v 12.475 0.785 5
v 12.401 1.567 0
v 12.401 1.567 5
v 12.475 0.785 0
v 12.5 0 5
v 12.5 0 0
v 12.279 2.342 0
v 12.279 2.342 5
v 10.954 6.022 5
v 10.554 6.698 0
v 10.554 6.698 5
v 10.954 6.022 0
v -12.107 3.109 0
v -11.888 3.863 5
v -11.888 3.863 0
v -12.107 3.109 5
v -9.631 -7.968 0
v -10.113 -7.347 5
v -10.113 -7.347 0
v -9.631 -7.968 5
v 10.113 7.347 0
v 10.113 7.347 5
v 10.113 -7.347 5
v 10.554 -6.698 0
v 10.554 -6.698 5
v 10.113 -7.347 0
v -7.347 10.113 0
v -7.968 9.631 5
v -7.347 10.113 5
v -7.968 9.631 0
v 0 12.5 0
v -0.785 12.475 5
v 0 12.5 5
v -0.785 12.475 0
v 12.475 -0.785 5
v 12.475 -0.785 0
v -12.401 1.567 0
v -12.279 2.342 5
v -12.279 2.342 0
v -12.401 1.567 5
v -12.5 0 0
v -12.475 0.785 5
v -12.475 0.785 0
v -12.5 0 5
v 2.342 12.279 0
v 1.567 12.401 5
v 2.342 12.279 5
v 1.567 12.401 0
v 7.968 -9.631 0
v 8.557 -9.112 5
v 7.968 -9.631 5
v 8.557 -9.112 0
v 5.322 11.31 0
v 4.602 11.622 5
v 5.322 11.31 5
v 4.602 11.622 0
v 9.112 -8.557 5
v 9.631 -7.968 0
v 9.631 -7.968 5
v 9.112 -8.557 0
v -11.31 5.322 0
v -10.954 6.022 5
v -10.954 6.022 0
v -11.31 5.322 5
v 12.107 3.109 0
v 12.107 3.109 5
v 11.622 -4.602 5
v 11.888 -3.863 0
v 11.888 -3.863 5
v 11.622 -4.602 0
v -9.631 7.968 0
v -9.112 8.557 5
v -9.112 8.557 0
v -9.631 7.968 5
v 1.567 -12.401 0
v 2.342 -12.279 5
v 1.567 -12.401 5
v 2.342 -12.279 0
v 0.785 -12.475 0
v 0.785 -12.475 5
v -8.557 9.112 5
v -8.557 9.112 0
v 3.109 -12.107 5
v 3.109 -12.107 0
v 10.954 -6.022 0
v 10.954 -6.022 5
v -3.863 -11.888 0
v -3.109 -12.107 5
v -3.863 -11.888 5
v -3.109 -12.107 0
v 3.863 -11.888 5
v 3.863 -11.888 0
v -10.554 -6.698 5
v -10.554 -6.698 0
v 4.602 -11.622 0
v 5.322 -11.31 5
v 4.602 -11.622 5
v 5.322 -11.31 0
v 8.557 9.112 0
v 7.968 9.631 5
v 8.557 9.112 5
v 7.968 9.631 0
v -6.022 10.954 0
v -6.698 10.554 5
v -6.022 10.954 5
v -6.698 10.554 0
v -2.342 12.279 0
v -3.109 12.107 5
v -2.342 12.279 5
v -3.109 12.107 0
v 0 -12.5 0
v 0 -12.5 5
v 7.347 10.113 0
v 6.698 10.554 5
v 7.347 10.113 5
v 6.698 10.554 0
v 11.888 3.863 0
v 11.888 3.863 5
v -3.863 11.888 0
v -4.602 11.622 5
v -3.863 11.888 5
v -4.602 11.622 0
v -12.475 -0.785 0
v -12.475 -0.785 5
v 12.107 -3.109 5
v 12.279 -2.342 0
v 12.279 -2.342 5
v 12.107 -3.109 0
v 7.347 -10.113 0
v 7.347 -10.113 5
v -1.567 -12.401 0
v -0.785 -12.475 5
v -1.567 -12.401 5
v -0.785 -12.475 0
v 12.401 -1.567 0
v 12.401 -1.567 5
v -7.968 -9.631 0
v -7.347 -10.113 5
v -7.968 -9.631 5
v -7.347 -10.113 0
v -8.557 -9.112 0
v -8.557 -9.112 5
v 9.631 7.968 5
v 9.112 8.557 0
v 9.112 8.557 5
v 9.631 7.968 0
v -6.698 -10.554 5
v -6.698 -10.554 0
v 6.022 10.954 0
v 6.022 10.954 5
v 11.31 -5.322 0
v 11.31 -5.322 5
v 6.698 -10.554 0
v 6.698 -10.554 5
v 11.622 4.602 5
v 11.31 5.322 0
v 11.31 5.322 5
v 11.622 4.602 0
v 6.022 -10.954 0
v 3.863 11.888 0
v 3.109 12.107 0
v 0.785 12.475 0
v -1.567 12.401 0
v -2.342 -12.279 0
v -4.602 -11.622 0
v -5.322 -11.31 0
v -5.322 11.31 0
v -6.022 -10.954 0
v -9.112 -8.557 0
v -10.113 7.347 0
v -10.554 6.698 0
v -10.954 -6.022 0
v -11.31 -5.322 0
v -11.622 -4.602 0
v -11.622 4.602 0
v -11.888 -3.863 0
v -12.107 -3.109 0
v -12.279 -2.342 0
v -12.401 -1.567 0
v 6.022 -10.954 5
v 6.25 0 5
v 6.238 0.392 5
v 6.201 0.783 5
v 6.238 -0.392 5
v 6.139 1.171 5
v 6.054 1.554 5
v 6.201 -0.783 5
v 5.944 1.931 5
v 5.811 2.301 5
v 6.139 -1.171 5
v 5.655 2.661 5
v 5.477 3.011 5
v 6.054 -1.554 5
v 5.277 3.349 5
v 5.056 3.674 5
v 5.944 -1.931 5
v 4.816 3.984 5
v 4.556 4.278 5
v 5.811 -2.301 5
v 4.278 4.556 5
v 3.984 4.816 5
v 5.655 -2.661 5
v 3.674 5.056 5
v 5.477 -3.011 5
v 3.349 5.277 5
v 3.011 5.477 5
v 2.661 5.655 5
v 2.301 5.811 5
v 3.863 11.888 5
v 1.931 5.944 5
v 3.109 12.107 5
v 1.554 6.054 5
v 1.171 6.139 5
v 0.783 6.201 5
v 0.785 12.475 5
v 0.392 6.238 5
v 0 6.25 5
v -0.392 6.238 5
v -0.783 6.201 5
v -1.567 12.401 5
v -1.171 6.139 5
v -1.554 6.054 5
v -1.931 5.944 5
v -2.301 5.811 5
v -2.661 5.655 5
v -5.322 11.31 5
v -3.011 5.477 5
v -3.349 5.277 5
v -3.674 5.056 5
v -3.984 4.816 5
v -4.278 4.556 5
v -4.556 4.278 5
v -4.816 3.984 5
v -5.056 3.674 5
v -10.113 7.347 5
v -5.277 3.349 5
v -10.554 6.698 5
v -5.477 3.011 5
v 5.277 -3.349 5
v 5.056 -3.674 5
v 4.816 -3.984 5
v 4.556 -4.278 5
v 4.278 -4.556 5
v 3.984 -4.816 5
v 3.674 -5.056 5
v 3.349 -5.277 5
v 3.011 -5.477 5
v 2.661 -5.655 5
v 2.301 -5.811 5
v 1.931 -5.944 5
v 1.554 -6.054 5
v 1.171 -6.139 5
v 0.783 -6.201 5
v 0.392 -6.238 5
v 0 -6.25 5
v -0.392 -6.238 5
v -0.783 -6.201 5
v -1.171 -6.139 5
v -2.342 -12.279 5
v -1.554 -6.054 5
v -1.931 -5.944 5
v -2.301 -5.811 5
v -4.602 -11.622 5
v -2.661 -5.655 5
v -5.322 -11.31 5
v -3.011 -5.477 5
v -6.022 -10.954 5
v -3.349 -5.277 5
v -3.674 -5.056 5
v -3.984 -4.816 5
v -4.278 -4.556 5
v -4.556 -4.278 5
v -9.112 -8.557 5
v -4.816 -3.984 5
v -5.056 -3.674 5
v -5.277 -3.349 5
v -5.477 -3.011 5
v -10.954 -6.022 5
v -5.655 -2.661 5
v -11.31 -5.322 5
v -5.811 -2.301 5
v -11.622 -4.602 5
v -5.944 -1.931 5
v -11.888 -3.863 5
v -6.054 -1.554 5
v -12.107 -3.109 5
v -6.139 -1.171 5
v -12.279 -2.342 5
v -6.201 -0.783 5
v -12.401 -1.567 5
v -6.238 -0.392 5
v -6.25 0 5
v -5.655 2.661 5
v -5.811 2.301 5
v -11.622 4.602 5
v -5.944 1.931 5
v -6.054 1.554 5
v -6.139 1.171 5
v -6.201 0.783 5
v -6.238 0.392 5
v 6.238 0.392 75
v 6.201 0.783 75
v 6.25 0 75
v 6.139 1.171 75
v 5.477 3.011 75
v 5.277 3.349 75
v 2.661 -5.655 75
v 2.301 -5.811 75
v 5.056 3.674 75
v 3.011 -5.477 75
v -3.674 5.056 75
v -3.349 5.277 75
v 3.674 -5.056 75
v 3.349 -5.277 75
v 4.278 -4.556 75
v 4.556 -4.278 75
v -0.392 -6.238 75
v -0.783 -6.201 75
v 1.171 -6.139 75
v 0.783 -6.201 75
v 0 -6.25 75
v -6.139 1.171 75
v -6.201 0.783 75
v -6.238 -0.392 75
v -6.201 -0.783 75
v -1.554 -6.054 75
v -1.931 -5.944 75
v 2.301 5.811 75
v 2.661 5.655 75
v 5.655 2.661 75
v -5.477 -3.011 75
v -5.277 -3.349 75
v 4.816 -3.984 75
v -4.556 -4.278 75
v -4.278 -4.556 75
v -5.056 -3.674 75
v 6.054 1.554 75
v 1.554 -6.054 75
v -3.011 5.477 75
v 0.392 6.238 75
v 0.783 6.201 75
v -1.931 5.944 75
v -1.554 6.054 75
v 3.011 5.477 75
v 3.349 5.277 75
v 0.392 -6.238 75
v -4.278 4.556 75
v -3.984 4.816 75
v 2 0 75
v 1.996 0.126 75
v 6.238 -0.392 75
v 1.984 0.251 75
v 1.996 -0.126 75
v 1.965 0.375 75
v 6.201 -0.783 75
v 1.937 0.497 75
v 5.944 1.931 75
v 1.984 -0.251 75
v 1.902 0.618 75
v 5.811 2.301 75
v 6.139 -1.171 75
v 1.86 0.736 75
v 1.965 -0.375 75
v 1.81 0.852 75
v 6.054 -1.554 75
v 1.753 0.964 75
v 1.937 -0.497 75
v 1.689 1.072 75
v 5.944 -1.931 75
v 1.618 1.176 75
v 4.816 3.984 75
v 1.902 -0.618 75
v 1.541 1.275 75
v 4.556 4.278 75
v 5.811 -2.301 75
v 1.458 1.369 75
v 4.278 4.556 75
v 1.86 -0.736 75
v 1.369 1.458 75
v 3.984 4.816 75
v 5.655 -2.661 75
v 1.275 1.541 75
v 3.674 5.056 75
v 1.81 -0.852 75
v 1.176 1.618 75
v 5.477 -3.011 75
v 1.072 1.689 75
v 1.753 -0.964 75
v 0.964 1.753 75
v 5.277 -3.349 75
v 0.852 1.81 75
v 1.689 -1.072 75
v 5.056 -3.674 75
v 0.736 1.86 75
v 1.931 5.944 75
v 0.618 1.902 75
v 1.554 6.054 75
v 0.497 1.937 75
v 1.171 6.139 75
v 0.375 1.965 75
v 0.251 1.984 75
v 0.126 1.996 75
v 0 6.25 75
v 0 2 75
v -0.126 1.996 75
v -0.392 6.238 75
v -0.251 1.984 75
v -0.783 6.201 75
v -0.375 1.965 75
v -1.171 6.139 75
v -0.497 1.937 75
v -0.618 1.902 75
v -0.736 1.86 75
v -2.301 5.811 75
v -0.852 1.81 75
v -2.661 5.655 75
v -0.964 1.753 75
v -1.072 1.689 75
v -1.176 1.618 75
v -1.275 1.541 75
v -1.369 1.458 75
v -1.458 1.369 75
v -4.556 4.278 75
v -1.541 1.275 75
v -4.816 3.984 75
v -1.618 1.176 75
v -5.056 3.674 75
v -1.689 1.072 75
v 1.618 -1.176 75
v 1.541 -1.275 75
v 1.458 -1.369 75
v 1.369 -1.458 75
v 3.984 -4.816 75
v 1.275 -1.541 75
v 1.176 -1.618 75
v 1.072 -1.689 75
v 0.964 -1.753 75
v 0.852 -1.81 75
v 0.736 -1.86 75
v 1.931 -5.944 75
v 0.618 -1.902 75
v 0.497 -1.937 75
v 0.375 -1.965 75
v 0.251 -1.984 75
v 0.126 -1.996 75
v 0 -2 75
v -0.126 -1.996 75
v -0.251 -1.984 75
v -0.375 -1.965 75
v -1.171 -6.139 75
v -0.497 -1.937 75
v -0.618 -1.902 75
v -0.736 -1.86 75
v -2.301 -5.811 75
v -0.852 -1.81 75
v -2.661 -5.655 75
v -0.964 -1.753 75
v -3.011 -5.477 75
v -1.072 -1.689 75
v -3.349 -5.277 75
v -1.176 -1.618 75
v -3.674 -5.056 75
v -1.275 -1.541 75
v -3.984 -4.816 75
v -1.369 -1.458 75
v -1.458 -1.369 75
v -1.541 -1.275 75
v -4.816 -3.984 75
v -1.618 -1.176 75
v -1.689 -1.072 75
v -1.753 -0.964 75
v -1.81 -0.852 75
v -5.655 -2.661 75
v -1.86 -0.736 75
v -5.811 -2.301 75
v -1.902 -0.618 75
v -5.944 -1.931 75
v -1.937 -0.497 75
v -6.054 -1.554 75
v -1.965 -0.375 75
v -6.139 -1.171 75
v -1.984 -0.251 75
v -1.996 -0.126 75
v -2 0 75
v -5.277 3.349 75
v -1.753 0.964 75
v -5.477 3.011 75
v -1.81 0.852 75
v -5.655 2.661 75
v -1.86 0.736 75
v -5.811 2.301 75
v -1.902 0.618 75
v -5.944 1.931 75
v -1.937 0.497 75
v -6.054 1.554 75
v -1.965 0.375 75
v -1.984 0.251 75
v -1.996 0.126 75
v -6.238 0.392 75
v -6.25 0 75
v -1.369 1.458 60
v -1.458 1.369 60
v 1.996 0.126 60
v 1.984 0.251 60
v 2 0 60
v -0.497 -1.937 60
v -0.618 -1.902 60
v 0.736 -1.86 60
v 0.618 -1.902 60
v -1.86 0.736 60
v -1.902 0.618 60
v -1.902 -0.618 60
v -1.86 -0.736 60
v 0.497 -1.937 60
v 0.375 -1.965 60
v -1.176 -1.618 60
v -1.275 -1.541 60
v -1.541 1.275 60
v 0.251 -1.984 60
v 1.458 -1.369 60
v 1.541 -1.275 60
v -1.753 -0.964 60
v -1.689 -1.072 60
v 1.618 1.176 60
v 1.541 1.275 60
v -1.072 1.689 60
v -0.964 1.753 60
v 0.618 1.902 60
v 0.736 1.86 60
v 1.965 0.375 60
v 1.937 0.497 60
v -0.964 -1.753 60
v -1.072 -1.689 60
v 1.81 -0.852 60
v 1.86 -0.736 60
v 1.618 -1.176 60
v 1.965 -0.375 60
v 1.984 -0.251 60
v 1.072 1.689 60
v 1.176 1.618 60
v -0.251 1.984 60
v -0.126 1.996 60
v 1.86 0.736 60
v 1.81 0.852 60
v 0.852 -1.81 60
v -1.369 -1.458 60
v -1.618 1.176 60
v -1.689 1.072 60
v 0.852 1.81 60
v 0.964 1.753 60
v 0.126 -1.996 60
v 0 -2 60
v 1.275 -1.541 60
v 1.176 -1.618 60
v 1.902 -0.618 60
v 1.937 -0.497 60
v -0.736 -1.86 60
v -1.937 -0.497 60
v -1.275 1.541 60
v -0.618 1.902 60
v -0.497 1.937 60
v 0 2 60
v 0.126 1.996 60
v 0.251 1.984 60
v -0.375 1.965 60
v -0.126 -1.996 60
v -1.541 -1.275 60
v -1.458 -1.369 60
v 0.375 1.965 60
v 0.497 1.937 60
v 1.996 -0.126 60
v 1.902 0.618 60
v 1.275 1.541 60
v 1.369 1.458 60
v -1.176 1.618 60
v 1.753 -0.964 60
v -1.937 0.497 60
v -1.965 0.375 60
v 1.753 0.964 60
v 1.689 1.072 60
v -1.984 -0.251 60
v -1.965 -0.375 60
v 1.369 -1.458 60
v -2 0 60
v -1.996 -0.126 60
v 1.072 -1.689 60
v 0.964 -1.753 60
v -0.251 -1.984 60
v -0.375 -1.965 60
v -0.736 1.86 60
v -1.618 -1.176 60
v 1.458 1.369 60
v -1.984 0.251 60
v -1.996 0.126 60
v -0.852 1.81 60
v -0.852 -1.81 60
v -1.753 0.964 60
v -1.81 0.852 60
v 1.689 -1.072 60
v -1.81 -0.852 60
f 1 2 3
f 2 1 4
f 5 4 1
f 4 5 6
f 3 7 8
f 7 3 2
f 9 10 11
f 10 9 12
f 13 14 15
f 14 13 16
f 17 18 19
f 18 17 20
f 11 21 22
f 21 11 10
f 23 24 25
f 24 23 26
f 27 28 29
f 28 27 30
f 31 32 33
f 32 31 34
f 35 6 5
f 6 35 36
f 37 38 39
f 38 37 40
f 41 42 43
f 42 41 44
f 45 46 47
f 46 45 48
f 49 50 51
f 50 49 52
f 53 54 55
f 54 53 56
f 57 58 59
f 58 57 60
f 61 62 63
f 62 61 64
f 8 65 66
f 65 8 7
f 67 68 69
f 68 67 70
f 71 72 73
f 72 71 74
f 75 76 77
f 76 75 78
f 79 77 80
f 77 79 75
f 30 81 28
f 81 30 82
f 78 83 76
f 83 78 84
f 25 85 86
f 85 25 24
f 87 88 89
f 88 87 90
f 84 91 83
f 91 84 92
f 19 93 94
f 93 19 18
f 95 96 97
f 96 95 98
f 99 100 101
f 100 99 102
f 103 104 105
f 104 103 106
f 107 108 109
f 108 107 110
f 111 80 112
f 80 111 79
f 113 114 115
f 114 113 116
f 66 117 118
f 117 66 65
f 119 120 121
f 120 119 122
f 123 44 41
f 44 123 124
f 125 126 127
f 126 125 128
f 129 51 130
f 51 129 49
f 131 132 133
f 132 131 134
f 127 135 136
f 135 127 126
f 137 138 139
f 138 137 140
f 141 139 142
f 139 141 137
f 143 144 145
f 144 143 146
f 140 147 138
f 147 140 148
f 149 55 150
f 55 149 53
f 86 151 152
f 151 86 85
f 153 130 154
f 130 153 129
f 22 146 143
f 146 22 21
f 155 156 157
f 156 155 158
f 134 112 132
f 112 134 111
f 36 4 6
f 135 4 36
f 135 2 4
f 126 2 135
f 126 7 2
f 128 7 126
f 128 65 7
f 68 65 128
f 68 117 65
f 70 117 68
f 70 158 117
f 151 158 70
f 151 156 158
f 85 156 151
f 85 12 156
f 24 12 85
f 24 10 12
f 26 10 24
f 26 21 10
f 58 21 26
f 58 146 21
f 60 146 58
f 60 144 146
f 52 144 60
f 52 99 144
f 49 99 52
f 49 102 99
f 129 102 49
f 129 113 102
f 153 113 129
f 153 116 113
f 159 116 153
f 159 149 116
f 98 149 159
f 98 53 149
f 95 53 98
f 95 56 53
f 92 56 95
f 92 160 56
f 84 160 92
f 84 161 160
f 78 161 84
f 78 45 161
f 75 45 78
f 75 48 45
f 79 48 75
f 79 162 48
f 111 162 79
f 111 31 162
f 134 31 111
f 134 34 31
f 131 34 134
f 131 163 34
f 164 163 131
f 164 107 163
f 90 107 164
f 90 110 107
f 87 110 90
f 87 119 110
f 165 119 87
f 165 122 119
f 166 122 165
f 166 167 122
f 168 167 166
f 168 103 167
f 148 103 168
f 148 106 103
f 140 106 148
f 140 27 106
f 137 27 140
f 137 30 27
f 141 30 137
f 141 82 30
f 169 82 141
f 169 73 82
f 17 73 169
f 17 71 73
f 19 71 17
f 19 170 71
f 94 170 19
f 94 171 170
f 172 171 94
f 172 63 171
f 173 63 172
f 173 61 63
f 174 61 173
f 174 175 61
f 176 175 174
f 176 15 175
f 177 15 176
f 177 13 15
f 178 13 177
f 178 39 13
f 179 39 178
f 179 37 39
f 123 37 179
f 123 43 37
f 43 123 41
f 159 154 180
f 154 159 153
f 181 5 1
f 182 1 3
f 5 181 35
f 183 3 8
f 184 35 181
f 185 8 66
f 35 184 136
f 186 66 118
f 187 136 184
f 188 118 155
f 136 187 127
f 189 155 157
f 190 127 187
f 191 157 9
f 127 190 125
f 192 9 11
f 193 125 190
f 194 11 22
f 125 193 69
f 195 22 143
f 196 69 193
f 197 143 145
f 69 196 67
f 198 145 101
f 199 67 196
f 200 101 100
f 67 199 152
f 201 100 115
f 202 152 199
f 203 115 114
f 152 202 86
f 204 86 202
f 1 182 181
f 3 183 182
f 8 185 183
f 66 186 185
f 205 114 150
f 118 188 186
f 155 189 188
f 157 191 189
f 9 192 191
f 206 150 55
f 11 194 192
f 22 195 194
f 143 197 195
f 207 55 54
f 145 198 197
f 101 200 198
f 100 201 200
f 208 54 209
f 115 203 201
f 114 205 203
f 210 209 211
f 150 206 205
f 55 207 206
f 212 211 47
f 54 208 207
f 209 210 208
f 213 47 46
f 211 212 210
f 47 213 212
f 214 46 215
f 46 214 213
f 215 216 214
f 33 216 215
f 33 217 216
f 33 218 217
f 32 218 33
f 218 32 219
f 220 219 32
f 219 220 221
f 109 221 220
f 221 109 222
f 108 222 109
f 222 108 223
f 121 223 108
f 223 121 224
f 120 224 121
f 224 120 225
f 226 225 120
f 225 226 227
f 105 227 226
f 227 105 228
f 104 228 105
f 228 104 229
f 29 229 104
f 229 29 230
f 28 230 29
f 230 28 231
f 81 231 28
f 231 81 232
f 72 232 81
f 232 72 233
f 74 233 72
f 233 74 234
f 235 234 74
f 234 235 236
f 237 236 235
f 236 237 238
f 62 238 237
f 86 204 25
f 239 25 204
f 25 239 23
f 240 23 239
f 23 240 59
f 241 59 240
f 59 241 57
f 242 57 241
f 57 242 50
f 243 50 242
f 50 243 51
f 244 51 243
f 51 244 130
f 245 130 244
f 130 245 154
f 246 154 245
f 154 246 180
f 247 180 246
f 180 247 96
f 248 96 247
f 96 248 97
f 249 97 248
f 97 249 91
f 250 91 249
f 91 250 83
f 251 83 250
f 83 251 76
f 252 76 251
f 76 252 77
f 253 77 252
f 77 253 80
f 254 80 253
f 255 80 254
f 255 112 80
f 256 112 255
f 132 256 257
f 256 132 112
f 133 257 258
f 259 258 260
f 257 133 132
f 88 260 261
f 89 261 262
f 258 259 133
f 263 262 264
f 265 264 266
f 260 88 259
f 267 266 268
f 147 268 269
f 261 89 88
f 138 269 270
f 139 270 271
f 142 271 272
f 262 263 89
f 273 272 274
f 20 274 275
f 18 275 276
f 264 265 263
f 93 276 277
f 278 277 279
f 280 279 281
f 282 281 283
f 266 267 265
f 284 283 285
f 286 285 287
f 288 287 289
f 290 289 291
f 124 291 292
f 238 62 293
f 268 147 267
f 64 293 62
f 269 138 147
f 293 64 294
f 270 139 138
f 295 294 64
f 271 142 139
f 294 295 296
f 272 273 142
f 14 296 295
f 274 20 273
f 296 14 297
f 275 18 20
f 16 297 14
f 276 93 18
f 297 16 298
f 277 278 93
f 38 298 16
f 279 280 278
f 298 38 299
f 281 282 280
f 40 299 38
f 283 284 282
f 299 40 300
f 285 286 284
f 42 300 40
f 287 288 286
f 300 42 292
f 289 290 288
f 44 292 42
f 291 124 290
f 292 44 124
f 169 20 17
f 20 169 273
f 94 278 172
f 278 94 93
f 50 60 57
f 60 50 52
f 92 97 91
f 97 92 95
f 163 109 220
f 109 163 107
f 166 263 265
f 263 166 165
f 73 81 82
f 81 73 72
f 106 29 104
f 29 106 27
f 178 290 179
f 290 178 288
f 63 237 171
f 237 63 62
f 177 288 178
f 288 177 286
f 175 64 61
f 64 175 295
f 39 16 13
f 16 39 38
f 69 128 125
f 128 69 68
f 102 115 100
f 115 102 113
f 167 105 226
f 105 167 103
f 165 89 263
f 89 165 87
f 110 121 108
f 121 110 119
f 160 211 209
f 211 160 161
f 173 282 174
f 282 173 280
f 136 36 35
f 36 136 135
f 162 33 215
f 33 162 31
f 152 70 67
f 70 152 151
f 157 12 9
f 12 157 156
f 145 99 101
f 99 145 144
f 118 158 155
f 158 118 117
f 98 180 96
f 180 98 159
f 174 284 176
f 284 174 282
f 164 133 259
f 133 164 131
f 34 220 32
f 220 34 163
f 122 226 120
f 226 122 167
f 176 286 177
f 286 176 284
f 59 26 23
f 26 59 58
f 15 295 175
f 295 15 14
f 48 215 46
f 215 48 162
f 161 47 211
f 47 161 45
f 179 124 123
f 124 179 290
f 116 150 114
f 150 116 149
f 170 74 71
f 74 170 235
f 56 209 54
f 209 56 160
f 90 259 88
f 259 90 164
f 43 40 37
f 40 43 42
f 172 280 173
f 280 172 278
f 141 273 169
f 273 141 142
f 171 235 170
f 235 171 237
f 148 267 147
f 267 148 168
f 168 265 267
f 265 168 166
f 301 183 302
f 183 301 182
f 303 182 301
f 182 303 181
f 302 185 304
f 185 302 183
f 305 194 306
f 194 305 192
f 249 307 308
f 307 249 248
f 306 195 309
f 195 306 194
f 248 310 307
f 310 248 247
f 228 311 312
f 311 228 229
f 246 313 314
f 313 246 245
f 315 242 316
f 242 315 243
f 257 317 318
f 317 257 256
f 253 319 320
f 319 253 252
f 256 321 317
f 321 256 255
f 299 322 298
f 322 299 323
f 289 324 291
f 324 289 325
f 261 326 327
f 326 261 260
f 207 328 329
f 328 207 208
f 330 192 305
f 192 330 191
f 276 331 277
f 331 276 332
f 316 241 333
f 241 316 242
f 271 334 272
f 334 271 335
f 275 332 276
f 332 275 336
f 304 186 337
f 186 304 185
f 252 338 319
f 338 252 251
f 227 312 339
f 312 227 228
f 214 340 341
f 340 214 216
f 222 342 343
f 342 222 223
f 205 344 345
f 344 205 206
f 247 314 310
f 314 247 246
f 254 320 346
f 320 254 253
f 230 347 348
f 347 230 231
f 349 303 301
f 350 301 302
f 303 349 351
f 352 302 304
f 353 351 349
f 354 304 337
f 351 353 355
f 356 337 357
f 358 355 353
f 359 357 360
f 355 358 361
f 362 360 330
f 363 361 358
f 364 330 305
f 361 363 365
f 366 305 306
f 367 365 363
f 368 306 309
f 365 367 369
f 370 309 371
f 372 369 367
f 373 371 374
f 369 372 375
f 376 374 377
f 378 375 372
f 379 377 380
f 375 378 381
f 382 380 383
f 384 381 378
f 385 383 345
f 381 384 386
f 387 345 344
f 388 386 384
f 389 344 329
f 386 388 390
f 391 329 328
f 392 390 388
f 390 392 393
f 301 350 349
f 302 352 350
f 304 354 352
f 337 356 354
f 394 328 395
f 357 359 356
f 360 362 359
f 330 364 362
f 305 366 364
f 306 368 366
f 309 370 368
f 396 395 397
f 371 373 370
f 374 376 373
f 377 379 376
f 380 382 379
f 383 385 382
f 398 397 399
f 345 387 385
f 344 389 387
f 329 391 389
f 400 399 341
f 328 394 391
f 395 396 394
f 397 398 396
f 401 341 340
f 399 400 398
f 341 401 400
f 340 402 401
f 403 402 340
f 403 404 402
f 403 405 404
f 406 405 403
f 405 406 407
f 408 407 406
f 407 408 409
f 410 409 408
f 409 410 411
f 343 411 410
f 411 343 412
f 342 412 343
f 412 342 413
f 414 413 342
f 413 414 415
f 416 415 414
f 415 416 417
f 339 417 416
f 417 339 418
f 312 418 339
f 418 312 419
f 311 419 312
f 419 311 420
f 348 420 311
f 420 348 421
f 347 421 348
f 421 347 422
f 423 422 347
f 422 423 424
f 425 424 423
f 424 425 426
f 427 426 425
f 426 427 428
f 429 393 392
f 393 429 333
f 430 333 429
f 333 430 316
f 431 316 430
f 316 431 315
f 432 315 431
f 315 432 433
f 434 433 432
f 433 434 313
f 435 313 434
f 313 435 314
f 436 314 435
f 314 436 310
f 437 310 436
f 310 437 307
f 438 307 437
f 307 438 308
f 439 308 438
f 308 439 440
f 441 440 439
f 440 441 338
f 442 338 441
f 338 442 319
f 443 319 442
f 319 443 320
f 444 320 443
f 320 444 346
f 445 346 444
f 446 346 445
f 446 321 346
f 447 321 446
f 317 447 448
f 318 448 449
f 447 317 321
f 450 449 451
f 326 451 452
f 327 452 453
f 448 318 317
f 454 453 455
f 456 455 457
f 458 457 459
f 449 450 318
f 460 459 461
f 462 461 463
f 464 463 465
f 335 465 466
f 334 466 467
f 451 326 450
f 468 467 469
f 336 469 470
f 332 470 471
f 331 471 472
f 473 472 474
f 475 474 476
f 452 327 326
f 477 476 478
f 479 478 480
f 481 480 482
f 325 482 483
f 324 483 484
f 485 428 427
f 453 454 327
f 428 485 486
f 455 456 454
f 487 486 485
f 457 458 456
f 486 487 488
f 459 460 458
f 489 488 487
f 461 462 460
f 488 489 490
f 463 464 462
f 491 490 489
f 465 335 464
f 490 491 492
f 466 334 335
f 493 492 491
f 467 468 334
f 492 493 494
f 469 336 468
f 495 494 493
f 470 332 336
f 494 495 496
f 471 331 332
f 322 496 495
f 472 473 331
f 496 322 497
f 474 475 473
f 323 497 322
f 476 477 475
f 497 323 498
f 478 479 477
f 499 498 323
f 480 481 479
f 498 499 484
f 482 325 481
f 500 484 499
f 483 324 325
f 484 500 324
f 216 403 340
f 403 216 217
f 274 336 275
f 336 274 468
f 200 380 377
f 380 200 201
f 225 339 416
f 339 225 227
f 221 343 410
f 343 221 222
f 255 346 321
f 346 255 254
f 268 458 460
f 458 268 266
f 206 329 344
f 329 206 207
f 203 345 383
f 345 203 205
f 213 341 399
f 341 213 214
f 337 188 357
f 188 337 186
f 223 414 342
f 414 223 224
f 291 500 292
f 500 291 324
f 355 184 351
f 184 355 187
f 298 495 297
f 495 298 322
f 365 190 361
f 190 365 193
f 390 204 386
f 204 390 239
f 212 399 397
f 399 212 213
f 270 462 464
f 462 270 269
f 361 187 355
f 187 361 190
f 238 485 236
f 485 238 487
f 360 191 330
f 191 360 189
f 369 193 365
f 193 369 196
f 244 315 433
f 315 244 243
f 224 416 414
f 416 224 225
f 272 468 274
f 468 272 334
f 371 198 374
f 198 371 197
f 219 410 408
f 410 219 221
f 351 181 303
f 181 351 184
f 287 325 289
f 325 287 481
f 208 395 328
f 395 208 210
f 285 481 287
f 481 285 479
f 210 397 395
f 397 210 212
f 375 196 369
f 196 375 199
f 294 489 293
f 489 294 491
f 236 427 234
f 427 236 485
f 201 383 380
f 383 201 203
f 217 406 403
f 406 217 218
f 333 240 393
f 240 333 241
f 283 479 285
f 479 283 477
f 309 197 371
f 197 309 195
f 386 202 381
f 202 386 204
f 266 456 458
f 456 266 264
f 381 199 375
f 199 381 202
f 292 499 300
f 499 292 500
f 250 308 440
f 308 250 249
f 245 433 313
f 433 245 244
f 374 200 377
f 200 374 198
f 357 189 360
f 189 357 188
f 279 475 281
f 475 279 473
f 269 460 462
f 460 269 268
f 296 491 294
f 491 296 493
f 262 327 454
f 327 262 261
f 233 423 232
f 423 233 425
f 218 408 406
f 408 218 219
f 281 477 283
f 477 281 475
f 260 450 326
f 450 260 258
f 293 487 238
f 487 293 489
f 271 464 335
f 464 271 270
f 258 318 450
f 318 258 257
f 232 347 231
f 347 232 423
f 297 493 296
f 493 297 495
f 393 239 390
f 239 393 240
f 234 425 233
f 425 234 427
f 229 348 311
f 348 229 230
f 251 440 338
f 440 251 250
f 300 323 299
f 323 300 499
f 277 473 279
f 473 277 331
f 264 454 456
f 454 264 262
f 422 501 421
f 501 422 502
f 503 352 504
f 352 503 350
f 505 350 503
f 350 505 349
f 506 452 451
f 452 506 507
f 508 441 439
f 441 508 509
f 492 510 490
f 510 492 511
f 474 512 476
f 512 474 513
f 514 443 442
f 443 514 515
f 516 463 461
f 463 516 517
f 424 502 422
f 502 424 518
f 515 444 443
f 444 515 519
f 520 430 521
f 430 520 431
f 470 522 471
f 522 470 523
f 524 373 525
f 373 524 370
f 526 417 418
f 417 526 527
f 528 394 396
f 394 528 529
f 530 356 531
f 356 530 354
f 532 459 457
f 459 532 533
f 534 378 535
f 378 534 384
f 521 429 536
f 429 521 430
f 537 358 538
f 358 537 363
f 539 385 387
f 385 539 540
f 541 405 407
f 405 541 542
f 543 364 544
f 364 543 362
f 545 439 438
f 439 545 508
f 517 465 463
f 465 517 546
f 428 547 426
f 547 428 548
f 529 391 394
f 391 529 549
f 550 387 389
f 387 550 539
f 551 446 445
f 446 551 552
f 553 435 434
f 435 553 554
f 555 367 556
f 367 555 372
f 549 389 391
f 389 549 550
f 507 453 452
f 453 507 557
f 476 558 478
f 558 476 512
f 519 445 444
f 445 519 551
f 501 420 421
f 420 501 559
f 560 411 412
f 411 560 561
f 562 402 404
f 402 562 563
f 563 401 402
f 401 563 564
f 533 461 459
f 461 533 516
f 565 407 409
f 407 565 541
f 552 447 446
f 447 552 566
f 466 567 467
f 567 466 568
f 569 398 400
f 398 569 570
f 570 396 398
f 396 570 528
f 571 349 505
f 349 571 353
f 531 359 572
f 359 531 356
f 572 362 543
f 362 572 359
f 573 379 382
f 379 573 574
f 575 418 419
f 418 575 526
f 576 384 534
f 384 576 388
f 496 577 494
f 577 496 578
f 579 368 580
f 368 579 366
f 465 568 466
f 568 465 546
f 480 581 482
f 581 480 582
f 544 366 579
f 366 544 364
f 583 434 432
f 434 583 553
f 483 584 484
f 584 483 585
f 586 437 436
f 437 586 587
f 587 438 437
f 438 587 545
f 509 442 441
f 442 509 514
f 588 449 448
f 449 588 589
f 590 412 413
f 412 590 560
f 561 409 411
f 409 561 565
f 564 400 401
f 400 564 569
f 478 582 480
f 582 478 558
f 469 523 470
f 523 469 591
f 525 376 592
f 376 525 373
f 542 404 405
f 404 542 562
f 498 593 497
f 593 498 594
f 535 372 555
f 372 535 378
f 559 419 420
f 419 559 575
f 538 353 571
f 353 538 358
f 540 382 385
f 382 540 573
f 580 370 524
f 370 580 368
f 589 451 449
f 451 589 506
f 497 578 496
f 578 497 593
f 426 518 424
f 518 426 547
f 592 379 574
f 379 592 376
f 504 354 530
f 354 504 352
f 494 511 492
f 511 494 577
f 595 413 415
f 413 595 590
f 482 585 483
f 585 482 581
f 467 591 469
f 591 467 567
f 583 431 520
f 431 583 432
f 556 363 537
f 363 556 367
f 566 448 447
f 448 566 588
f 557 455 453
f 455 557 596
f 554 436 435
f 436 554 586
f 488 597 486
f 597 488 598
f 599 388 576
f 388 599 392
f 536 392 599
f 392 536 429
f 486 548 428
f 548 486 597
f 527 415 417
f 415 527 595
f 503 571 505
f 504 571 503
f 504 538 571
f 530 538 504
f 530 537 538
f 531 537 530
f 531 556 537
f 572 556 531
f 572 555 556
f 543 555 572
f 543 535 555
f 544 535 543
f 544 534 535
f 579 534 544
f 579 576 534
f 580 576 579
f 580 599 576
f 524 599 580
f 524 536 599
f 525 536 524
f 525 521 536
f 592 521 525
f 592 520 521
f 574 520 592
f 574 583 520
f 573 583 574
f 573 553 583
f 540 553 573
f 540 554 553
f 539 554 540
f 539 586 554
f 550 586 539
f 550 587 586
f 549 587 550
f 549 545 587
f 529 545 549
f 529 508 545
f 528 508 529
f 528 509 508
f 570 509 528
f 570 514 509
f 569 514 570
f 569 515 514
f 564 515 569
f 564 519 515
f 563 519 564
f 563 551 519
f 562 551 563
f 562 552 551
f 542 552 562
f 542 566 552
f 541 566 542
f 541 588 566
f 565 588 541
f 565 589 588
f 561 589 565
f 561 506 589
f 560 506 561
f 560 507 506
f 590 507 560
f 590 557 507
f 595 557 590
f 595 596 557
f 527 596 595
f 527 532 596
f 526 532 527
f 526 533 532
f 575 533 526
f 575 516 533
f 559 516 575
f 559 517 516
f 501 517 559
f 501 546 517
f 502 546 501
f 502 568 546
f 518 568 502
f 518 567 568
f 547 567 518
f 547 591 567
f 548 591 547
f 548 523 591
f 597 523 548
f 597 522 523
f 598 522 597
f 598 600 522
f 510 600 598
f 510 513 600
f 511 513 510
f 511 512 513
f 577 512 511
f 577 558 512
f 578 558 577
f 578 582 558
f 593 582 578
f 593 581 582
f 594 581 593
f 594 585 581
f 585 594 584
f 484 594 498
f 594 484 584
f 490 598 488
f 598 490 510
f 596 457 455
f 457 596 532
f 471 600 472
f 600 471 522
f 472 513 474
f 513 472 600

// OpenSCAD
// Flange Stand

base_d = 25;
base_h = 5;

shaft_d = 12.5;
shaft_h = 70;

hole_d = 4;
hole_depth = 15;

difference() {
    union() {
        // Base
        cylinder(d=base_d, h=base_h, $fn=100);

        // Shaft
        translate([0, 0, base_h])
            cylinder(d=shaft_d, h=shaft_h, $fn=100);
    }

    // Top hole
    translate([0, 0, base_h + shaft_h - hole_depth])
        cylinder(d=hole_d, h=hole_depth + 0.1, $fn=100);
}
